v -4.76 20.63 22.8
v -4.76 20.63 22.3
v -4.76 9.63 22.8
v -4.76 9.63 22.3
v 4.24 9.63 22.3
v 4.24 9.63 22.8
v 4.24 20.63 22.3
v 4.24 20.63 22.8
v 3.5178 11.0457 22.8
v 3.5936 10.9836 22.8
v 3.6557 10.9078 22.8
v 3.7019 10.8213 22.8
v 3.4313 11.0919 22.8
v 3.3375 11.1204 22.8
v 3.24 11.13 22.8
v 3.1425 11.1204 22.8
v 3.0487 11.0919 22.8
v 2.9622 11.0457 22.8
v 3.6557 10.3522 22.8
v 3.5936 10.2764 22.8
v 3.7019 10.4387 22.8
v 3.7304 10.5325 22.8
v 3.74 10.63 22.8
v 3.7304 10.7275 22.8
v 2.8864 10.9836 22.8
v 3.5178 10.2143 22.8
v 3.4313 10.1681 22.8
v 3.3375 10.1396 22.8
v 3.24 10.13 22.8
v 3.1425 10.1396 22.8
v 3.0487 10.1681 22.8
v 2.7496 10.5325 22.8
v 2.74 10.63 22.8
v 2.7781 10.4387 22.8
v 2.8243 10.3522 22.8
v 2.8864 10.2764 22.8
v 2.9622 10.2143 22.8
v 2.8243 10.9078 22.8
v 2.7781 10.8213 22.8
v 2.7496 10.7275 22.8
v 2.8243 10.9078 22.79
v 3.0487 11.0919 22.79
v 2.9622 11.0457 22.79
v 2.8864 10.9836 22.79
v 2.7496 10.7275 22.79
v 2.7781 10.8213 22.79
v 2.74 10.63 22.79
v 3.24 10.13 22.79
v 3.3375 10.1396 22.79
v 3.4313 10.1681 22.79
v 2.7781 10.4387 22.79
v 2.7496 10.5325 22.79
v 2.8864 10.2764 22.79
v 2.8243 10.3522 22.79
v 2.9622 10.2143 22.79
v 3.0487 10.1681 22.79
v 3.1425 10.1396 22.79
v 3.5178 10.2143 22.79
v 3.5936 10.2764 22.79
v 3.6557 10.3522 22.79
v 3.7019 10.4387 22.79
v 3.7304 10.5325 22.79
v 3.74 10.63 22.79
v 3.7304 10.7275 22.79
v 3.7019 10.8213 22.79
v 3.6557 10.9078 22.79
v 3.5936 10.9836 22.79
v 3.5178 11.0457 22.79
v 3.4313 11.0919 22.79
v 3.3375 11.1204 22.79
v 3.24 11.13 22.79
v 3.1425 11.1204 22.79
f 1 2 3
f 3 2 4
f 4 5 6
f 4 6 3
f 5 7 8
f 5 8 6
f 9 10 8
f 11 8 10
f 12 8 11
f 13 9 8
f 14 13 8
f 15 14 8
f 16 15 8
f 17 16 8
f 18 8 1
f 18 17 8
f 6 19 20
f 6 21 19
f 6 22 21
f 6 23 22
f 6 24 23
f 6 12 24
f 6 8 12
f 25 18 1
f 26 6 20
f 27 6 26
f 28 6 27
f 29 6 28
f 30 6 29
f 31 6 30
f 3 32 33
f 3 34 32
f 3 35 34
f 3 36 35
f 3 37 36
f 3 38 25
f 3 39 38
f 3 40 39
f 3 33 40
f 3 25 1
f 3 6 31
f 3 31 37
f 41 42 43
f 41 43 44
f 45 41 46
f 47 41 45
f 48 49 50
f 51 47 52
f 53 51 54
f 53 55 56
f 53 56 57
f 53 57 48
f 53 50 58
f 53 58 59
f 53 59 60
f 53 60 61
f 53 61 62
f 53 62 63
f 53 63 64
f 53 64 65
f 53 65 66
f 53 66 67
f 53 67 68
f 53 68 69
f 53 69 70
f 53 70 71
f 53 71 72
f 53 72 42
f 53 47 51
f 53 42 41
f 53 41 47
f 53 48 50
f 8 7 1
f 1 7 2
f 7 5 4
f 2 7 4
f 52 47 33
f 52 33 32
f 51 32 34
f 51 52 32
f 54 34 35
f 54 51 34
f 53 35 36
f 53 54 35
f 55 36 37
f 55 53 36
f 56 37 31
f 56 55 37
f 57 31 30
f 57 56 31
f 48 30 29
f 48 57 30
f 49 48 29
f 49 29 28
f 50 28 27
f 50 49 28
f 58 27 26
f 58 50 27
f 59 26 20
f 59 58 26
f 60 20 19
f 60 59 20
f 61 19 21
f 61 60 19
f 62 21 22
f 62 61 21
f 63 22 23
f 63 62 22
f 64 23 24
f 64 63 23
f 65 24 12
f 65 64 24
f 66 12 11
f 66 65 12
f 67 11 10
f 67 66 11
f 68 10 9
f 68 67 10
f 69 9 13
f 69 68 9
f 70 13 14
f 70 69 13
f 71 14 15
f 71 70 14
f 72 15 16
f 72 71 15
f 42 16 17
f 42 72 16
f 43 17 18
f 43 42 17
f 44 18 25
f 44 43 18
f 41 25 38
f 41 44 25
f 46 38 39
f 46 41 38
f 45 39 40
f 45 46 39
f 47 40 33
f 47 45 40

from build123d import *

# Parameters (mm, degrees)
CYLINDER030_R          = 0.5
CYLINDER030_DEPTH      = 0.01
BOX075_W               = 9
BOX075_H               = 11
BOX075_DEPTH           = 0.5
CUT023_PLACEMENT_ANGLE = 180


with BuildPart() as cylinder030:
    # Cylinder030 → Cylinder030 (new body)
    with BuildSketch(Plane(origin=(1, 10, 0.49), x_dir=(1, 0, 0), z_dir=(0, 0, 1))):
        Circle(CYLINDER030_R)
    extrude(amount=CYLINDER030_DEPTH)


with BuildPart() as large_linbo3_plate019:
    # Box075 → Box075 (new body)
    with BuildSketch(Plane.XY):
        with Locations((4.5, 5.5)):
            Rectangle(BOX075_W, BOX075_H)
    extrude(amount=BOX075_DEPTH)

    # Cut023: cut Cylinder030
    add(cylinder030.part, mode=Mode.SUBTRACT)


with BuildPart() as large_linbo3_plate019_1:
    # Cut023 placement: moved
    add(large_linbo3_plate019.part.moved(Location((4.24, 20.63, 22.3))).rotate(Axis((4.24, 20.63, 22.3), (0, 0, 1)), CUT023_PLACEMENT_ANGLE))


solid = large_linbo3_plate019_1.part
